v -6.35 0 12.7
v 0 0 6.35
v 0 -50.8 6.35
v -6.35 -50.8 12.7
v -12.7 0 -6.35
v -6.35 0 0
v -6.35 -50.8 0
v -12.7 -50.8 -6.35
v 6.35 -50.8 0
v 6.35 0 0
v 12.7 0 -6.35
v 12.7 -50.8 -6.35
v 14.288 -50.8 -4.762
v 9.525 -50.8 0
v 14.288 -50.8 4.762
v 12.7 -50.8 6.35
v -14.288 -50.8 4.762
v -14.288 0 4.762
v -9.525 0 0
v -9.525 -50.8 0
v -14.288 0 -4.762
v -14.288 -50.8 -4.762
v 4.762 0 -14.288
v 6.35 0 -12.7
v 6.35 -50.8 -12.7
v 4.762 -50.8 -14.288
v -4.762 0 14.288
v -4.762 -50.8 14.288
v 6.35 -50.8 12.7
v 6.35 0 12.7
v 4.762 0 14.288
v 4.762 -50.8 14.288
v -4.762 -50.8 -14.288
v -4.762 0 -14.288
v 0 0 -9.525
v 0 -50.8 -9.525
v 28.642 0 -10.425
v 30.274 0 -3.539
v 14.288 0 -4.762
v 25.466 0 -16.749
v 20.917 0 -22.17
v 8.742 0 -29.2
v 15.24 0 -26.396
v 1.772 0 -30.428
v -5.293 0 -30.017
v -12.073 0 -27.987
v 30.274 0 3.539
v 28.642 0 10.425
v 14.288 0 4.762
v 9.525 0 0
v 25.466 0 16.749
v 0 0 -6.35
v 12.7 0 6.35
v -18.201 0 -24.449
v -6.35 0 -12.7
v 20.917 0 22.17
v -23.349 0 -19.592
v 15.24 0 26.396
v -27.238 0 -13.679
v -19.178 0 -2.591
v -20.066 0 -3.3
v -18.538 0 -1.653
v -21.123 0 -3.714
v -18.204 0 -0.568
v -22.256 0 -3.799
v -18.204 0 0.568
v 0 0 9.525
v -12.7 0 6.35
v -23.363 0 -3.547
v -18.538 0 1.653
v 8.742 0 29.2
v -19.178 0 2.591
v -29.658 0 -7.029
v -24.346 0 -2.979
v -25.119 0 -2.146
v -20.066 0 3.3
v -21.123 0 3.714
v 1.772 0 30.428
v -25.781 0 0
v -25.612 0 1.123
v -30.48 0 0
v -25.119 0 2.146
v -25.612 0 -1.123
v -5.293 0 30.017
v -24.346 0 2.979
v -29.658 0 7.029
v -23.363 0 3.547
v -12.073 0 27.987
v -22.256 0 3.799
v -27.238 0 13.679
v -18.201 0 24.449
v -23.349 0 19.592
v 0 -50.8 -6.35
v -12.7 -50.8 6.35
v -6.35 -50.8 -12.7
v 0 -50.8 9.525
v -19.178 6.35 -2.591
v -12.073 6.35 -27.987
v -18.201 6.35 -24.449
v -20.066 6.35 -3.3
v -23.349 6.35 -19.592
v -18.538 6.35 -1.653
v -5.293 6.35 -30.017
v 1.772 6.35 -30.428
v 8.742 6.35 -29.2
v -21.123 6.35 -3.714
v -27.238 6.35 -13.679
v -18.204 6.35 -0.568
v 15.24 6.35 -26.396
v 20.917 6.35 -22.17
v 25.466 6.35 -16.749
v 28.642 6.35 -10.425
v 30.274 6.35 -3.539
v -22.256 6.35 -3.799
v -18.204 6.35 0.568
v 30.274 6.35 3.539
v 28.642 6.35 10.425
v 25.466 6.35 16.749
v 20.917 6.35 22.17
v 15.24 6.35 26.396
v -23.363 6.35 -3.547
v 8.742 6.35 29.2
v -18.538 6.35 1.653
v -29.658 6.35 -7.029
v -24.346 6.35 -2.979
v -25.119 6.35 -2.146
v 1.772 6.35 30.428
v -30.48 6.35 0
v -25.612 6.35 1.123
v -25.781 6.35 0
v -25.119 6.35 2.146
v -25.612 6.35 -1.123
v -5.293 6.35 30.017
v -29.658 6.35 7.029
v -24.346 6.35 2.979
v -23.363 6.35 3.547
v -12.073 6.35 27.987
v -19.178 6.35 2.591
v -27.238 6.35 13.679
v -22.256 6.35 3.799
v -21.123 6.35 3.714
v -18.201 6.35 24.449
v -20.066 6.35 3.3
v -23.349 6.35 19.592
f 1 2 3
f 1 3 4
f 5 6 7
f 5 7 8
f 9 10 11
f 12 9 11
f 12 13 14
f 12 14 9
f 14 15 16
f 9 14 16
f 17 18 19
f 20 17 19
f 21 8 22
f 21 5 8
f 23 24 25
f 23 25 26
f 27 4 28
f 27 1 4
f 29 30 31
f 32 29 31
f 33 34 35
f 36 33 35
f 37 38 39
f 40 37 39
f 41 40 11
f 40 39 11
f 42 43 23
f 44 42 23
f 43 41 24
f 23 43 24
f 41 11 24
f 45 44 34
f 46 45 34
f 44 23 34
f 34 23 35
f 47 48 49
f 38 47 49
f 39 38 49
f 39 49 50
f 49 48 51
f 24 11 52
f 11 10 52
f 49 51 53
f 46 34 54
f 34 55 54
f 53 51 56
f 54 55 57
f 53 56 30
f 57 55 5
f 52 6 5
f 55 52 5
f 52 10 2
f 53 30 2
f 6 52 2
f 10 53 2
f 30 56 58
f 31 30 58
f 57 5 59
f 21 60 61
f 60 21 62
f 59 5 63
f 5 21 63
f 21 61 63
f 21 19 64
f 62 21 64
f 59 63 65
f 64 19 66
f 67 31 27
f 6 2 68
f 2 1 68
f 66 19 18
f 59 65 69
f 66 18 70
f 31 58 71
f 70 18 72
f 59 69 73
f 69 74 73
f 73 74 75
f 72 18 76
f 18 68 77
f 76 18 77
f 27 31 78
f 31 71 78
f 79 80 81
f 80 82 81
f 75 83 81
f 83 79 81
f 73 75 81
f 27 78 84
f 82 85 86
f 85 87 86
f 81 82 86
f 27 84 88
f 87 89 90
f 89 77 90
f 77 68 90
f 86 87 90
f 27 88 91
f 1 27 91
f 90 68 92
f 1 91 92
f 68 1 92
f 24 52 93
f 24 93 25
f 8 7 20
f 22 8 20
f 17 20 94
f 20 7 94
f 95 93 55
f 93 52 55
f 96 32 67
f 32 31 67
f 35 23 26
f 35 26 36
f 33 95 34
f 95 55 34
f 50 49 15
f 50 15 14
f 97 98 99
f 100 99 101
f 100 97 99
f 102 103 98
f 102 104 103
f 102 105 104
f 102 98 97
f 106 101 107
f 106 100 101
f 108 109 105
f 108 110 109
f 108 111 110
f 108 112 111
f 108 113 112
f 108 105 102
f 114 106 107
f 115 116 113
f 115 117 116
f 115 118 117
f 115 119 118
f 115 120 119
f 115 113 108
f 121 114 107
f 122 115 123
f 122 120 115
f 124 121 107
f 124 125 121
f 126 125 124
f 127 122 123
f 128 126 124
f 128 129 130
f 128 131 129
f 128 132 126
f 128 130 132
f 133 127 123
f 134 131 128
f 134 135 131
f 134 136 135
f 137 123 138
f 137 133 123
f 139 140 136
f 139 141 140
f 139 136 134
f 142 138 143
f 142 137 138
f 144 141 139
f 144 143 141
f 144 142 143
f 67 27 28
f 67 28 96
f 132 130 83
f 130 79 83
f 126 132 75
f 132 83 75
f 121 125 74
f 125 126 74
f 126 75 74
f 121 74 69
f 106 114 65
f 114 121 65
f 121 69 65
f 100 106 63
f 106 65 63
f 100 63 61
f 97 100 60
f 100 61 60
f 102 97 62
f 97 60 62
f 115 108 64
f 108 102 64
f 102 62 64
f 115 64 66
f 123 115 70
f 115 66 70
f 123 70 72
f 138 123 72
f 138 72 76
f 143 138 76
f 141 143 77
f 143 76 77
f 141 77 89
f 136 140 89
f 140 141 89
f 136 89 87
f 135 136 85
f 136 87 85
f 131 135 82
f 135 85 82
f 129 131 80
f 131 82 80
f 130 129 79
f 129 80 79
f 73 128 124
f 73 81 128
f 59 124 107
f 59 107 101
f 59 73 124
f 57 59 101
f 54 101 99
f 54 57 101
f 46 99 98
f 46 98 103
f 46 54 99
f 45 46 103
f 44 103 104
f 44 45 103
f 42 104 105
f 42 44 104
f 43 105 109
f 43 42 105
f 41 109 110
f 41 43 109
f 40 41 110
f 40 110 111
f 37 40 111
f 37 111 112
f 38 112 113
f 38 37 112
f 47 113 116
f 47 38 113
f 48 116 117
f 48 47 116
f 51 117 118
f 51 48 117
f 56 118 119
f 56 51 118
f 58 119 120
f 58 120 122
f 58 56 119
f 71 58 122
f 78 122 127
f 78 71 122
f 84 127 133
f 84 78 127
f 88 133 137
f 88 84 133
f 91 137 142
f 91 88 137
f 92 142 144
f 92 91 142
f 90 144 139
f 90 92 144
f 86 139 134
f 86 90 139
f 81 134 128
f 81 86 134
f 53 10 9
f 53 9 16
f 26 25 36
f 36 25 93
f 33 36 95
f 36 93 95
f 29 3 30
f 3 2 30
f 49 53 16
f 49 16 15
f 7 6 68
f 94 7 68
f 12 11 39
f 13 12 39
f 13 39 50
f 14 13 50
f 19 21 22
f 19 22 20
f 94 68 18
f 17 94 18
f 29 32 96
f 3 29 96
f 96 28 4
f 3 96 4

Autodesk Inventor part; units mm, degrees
ref_plane "YZ Plane" through (0, 0, 0) normal (1, 0, 0) x (0, 1, 0)
ref_plane "XZ Plane" through (0, 0, 0) normal (0, 1, 0) x (-1, 0, 0)
ref_plane "XY Plane" through (0, 0, 0) normal (0, 0, 1) x (1, 0, 0)
sketch "Sketch1" plane through (0, 0, 0) normal (0, 1, 0) x (-1, 0, 0)
  circle A0 centre (0, 0) radius 30.48
  line L0 (-6.35, 0) -> (-12.7, 6.35)
  line L1 (-12.7, 6.35) -> (-14.2875, 4.7625)
  line L2 (-14.2875, 4.7625) -> (-9.525, 0)
  line L3 (-9.525, 0) -> (-6.35, 0)
  line L4 (-6.35, 0) -> (-12.7, -6.35)
  line L5 (-12.7, -6.35) -> (-14.2875, -4.7625)
  line L6 (-14.2875, -4.7625) -> (-9.525, 0)
  line L7 (0, 30.48) -> (0, -30.48)
  line L8 (0, -6.35) -> (-6.35, -12.7)
  line L9 (-6.35, -12.7) -> (-4.7625, -14.2875)
  line L10 (-4.7625, -14.2875) -> (0, -9.525)
  line L11 (0, -9.525) -> (0, -6.35)
  line L12 (4.7625, -14.2875) -> (0, -9.525)
  line L13 (6.35, -12.7) -> (4.7625, -14.2875)
  line L14 (0, -6.35) -> (6.35, -12.7)
  line L15 (6.35, 0) -> (12.7, -6.35)
  line L16 (12.7, -6.35) -> (14.2875, -4.7625)
  line L17 (14.2875, -4.7625) -> (9.525, 0)
  line L18 (9.525, 0) -> (6.35, 0)
  line L19 (14.2875, 4.7625) -> (9.525, 0)
  line L20 (12.7, 6.35) -> (14.2875, 4.7625)
  line L21 (6.35, 0) -> (12.7, 6.35)
  line L22 (0, 6.35) -> (6.35, 12.7)
  line L23 (6.35, 12.7) -> (4.7625, 14.2875)
  line L24 (4.7625, 14.2875) -> (0, 9.525)
  line L25 (0, 9.525) -> (0, 6.35)
  line L26 (-4.7625, 14.2875) -> (0, 9.525)
  line L27 (-6.35, 12.7) -> (-4.7625, 14.2875)
  line L28 (0, 6.35) -> (-6.35, 12.7)
  circle A1 centre (21.971, 0) radius 3.81
  point P0 (-7.9375, 0)
  point P1 (0, -7.9375)
  point P2 (7.9375, 0)
  point P3 (0, 7.9375)
  dimension "d0" = 60.96
  dimension "d3" = 45
  dimension "d6" = 6.35
  dimension "d7" = 3.175
  dimension "d8" = 6.35
  dimension "d11" = 360
  dimension "d15" = 7.62
  dimension "d16" = 21.971
extrude "Extrusion1" add sketch "Sketch1" along normal blind 6.35 contours A0 L7 L12 L13 L14 L22 L23 L24 | L7 L26 L27 L28 L8 L9 L10 A0 | L24 L23 L22 L7 | L7 L28 L27 L26 | L10 L9 L8 L7 | L7 L14 L13 L12 | L3 L2 L1 L0 | L4 L5 L6 L3 | L18 L17 L16 L15 | L21 L20 L19 L18 | A1
extrude "Extrusion2" add sketch "Sketch1" against normal blind 50.8 contours L24 L23 L22 L7 | L7 L28 L27 L26 | L10 L9 L8 L7 | L7 L14 L13 L12 | L3 L2 L1 L0 | L4 L5 L6 L3 | L18 L17 L16 L15 | L21 L20 L19 L18
extrude "Extrusion3" cut sketch "Sketch1" along normal blind 6.35 contours A1
properties part number "OGPlatform" material "ABS Plastic"
